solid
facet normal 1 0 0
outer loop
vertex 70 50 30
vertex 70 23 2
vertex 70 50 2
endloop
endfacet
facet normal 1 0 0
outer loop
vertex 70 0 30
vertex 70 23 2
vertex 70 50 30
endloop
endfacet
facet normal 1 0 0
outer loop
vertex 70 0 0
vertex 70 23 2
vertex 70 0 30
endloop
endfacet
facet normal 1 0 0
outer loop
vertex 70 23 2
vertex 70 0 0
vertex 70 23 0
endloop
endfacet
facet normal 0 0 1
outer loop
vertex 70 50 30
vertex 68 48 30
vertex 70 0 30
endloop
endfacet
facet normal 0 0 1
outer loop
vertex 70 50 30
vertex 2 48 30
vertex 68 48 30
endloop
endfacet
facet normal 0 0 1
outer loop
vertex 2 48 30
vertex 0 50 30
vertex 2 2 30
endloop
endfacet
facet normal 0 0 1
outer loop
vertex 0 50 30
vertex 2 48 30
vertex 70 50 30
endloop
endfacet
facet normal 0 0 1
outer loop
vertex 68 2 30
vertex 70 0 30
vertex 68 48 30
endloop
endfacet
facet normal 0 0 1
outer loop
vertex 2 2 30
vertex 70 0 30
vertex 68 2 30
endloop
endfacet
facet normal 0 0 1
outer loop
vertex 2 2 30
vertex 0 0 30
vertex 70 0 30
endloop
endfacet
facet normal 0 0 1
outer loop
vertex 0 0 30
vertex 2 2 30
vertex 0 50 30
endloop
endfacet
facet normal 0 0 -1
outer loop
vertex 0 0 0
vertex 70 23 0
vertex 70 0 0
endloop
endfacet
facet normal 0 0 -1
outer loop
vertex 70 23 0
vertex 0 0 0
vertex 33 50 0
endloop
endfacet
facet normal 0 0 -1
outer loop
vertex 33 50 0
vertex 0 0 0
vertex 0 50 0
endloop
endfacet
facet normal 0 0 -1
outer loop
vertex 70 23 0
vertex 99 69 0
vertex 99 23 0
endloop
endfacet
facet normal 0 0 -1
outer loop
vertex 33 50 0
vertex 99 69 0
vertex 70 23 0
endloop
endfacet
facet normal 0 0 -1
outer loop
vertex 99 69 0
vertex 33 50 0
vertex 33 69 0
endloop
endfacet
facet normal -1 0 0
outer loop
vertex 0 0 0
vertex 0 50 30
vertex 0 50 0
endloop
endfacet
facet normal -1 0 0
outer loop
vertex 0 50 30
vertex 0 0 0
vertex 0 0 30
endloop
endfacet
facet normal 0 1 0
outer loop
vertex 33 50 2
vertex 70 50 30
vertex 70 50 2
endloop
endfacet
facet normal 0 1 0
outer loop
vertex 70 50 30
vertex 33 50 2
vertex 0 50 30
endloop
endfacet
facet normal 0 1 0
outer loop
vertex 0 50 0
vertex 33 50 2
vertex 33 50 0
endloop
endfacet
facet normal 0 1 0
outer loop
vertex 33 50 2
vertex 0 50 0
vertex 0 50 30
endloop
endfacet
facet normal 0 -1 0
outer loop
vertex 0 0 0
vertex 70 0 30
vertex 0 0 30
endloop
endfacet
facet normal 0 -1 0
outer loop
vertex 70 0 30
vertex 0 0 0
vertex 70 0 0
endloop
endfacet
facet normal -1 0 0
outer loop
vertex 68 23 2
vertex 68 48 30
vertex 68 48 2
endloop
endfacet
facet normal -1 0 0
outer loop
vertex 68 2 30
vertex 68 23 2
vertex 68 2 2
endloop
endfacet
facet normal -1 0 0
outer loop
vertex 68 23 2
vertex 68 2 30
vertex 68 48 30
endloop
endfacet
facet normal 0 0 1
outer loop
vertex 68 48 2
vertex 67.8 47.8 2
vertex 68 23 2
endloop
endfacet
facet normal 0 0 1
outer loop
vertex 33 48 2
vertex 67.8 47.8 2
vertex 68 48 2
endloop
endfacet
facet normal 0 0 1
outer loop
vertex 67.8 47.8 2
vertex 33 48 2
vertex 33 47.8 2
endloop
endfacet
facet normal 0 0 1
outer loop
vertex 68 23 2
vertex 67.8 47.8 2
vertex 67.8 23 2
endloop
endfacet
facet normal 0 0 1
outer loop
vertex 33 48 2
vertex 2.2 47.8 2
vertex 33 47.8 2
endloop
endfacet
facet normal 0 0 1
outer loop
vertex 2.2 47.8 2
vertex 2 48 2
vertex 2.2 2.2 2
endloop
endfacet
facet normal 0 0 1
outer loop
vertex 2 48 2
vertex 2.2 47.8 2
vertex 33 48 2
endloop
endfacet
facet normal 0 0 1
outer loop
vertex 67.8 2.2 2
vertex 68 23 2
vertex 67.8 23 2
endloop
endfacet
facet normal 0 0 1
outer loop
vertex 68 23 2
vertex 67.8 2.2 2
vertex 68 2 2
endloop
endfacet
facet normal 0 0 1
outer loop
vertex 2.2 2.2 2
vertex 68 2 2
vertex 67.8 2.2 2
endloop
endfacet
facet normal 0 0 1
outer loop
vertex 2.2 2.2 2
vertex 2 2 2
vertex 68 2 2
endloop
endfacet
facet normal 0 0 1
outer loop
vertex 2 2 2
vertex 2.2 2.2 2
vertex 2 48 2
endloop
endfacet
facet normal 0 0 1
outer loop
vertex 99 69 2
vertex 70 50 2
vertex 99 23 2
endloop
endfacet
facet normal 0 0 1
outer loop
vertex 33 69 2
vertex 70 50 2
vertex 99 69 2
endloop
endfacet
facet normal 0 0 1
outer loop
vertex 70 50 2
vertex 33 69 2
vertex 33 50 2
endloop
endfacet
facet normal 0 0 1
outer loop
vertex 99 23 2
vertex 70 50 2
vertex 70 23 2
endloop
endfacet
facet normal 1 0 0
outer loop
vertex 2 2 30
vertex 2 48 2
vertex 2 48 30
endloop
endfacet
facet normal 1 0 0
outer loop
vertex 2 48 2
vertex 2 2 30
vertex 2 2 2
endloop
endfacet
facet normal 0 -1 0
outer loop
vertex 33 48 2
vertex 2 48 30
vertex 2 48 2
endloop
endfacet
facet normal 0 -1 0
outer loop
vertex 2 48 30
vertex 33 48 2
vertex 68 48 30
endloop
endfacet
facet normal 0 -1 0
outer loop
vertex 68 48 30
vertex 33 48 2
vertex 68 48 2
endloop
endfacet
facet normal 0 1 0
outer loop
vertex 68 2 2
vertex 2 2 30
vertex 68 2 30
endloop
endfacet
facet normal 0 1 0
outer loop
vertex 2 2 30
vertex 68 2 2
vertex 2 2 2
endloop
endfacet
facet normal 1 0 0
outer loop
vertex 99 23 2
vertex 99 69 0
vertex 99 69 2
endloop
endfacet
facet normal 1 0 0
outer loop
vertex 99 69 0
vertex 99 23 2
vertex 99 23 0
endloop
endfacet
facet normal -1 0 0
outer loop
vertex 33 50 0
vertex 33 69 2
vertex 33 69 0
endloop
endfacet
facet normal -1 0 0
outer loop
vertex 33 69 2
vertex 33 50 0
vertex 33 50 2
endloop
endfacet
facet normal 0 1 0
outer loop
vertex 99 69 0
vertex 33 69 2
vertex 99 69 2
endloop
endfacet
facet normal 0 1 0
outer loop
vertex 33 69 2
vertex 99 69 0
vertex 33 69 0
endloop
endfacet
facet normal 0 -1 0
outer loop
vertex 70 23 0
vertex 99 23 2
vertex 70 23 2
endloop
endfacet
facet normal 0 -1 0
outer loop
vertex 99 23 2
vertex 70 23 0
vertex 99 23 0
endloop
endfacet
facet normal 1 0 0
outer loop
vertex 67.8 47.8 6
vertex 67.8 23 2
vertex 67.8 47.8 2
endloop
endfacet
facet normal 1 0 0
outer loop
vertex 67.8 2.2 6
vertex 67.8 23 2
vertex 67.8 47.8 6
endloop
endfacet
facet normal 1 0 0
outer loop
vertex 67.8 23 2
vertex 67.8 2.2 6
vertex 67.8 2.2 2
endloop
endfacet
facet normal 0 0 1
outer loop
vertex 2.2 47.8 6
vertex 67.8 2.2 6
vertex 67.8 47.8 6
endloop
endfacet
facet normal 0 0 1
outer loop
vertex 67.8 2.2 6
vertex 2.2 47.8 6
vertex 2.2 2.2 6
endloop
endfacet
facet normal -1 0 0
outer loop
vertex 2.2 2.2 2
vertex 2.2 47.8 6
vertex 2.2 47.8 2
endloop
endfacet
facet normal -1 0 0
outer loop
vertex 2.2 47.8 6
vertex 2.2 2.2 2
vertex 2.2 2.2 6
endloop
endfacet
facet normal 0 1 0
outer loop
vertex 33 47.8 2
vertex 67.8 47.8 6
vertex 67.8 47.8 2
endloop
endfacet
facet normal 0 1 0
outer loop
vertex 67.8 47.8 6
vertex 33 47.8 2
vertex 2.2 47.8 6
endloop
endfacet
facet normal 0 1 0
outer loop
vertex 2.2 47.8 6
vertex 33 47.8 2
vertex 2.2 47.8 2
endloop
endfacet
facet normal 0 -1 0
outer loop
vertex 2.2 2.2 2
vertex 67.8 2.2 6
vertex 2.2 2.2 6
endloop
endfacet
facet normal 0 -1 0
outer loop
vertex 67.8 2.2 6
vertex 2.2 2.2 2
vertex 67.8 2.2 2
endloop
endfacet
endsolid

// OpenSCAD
// Two-part enclosure for small electronics board
// Print orientation: box standing on bed, lid printed upside down on +X side

// ---- Box parameters ----
box_x = 70;      // outer length (X)
box_y = 50;      // outer width (Y)
box_z = 30;      // outer height (Z)
box_w = 2;       // wall thickness
box_f = 2;       // floor thickness

// ---- Lid parameters ----
lip_t = 1.5;     // lip wall thickness
lip_h = 4;       // lip height
lip_x = 65.6;    // outer lip length (X)
lip_y = 45.6;    // outer lip width (Y)
clear = 0.2;     // clearance between lip and box opening

// ---- Misc ----
eps = 0.5;       // cutter overshoot
$fn = 64;

// Derived
inner_x = box_x - 2 * box_w;
inner_y = box_y - 2 * box_w;
plate_x = lip_x + 2 * clear;
plate_y = lip_y + 2 * clear;

union() {
    // Box
    difference() {
        cube([box_x, box_y, box_z]);
        translate([box_w, box_w, box_f])
            cube([inner_x, inner_y, box_z - box_f]);
    }

    // Lid (upside down: plate on bed, lip pointing up into box)
    union() {
        translate([plate_x / 2, plate_y / 2, 0])
            cube([plate_x, plate_y, 2]);  // plate
        translate([box_x / 2 - lip_x / 2, box_y / 2 - lip_y / 2, 2])
            cube([lip_x, lip_y, lip_h]);  // lip
    }
}
